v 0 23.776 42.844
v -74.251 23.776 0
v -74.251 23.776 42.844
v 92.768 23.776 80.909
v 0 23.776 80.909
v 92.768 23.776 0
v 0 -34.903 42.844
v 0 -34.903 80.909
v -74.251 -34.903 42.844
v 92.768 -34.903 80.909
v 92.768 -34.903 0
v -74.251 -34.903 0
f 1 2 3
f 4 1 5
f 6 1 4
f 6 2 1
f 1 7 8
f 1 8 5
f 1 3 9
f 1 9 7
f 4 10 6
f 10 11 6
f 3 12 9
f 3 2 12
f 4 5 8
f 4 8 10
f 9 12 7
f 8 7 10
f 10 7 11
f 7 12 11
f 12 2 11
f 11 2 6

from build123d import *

# Parameters (mm, degrees)
F0_W     = 167.0182794333
F0_H     = 48.4514534473
F1_DEPTH = 42.8443159908
F2_DEPTH = 10.226784274
F3_W     = 92.7675813437
F3_H     = 58.6782377213
F4_DEPTH = 38.0648057908


with BuildPart() as f1:
    # F0 (on Top) → F1 (new body)
    with BuildSketch(Plane.XY):
        with Locations((9.258441627, -0.4500597715)):
            Rectangle(F0_W, F0_H)
    extrude(amount=F1_DEPTH)

    # F2 (add): a face of the model
    f2_faces = [f1.faces().sort_by_distance(p)[0] for p in [
        (9.258441627, -24.6757864952, 21.4221579954),
    ]]
    extrude(f2_faces, amount=F2_DEPTH)

    # F3 (on face) → F4 (join)
    with BuildSketch(Plane.XY.offset(42.8443159908)):
        with Locations((46.3837906718, -5.5634519085)):
            Rectangle(F3_W, F3_H)
    extrude(amount=F4_DEPTH)


solid = f1.part
